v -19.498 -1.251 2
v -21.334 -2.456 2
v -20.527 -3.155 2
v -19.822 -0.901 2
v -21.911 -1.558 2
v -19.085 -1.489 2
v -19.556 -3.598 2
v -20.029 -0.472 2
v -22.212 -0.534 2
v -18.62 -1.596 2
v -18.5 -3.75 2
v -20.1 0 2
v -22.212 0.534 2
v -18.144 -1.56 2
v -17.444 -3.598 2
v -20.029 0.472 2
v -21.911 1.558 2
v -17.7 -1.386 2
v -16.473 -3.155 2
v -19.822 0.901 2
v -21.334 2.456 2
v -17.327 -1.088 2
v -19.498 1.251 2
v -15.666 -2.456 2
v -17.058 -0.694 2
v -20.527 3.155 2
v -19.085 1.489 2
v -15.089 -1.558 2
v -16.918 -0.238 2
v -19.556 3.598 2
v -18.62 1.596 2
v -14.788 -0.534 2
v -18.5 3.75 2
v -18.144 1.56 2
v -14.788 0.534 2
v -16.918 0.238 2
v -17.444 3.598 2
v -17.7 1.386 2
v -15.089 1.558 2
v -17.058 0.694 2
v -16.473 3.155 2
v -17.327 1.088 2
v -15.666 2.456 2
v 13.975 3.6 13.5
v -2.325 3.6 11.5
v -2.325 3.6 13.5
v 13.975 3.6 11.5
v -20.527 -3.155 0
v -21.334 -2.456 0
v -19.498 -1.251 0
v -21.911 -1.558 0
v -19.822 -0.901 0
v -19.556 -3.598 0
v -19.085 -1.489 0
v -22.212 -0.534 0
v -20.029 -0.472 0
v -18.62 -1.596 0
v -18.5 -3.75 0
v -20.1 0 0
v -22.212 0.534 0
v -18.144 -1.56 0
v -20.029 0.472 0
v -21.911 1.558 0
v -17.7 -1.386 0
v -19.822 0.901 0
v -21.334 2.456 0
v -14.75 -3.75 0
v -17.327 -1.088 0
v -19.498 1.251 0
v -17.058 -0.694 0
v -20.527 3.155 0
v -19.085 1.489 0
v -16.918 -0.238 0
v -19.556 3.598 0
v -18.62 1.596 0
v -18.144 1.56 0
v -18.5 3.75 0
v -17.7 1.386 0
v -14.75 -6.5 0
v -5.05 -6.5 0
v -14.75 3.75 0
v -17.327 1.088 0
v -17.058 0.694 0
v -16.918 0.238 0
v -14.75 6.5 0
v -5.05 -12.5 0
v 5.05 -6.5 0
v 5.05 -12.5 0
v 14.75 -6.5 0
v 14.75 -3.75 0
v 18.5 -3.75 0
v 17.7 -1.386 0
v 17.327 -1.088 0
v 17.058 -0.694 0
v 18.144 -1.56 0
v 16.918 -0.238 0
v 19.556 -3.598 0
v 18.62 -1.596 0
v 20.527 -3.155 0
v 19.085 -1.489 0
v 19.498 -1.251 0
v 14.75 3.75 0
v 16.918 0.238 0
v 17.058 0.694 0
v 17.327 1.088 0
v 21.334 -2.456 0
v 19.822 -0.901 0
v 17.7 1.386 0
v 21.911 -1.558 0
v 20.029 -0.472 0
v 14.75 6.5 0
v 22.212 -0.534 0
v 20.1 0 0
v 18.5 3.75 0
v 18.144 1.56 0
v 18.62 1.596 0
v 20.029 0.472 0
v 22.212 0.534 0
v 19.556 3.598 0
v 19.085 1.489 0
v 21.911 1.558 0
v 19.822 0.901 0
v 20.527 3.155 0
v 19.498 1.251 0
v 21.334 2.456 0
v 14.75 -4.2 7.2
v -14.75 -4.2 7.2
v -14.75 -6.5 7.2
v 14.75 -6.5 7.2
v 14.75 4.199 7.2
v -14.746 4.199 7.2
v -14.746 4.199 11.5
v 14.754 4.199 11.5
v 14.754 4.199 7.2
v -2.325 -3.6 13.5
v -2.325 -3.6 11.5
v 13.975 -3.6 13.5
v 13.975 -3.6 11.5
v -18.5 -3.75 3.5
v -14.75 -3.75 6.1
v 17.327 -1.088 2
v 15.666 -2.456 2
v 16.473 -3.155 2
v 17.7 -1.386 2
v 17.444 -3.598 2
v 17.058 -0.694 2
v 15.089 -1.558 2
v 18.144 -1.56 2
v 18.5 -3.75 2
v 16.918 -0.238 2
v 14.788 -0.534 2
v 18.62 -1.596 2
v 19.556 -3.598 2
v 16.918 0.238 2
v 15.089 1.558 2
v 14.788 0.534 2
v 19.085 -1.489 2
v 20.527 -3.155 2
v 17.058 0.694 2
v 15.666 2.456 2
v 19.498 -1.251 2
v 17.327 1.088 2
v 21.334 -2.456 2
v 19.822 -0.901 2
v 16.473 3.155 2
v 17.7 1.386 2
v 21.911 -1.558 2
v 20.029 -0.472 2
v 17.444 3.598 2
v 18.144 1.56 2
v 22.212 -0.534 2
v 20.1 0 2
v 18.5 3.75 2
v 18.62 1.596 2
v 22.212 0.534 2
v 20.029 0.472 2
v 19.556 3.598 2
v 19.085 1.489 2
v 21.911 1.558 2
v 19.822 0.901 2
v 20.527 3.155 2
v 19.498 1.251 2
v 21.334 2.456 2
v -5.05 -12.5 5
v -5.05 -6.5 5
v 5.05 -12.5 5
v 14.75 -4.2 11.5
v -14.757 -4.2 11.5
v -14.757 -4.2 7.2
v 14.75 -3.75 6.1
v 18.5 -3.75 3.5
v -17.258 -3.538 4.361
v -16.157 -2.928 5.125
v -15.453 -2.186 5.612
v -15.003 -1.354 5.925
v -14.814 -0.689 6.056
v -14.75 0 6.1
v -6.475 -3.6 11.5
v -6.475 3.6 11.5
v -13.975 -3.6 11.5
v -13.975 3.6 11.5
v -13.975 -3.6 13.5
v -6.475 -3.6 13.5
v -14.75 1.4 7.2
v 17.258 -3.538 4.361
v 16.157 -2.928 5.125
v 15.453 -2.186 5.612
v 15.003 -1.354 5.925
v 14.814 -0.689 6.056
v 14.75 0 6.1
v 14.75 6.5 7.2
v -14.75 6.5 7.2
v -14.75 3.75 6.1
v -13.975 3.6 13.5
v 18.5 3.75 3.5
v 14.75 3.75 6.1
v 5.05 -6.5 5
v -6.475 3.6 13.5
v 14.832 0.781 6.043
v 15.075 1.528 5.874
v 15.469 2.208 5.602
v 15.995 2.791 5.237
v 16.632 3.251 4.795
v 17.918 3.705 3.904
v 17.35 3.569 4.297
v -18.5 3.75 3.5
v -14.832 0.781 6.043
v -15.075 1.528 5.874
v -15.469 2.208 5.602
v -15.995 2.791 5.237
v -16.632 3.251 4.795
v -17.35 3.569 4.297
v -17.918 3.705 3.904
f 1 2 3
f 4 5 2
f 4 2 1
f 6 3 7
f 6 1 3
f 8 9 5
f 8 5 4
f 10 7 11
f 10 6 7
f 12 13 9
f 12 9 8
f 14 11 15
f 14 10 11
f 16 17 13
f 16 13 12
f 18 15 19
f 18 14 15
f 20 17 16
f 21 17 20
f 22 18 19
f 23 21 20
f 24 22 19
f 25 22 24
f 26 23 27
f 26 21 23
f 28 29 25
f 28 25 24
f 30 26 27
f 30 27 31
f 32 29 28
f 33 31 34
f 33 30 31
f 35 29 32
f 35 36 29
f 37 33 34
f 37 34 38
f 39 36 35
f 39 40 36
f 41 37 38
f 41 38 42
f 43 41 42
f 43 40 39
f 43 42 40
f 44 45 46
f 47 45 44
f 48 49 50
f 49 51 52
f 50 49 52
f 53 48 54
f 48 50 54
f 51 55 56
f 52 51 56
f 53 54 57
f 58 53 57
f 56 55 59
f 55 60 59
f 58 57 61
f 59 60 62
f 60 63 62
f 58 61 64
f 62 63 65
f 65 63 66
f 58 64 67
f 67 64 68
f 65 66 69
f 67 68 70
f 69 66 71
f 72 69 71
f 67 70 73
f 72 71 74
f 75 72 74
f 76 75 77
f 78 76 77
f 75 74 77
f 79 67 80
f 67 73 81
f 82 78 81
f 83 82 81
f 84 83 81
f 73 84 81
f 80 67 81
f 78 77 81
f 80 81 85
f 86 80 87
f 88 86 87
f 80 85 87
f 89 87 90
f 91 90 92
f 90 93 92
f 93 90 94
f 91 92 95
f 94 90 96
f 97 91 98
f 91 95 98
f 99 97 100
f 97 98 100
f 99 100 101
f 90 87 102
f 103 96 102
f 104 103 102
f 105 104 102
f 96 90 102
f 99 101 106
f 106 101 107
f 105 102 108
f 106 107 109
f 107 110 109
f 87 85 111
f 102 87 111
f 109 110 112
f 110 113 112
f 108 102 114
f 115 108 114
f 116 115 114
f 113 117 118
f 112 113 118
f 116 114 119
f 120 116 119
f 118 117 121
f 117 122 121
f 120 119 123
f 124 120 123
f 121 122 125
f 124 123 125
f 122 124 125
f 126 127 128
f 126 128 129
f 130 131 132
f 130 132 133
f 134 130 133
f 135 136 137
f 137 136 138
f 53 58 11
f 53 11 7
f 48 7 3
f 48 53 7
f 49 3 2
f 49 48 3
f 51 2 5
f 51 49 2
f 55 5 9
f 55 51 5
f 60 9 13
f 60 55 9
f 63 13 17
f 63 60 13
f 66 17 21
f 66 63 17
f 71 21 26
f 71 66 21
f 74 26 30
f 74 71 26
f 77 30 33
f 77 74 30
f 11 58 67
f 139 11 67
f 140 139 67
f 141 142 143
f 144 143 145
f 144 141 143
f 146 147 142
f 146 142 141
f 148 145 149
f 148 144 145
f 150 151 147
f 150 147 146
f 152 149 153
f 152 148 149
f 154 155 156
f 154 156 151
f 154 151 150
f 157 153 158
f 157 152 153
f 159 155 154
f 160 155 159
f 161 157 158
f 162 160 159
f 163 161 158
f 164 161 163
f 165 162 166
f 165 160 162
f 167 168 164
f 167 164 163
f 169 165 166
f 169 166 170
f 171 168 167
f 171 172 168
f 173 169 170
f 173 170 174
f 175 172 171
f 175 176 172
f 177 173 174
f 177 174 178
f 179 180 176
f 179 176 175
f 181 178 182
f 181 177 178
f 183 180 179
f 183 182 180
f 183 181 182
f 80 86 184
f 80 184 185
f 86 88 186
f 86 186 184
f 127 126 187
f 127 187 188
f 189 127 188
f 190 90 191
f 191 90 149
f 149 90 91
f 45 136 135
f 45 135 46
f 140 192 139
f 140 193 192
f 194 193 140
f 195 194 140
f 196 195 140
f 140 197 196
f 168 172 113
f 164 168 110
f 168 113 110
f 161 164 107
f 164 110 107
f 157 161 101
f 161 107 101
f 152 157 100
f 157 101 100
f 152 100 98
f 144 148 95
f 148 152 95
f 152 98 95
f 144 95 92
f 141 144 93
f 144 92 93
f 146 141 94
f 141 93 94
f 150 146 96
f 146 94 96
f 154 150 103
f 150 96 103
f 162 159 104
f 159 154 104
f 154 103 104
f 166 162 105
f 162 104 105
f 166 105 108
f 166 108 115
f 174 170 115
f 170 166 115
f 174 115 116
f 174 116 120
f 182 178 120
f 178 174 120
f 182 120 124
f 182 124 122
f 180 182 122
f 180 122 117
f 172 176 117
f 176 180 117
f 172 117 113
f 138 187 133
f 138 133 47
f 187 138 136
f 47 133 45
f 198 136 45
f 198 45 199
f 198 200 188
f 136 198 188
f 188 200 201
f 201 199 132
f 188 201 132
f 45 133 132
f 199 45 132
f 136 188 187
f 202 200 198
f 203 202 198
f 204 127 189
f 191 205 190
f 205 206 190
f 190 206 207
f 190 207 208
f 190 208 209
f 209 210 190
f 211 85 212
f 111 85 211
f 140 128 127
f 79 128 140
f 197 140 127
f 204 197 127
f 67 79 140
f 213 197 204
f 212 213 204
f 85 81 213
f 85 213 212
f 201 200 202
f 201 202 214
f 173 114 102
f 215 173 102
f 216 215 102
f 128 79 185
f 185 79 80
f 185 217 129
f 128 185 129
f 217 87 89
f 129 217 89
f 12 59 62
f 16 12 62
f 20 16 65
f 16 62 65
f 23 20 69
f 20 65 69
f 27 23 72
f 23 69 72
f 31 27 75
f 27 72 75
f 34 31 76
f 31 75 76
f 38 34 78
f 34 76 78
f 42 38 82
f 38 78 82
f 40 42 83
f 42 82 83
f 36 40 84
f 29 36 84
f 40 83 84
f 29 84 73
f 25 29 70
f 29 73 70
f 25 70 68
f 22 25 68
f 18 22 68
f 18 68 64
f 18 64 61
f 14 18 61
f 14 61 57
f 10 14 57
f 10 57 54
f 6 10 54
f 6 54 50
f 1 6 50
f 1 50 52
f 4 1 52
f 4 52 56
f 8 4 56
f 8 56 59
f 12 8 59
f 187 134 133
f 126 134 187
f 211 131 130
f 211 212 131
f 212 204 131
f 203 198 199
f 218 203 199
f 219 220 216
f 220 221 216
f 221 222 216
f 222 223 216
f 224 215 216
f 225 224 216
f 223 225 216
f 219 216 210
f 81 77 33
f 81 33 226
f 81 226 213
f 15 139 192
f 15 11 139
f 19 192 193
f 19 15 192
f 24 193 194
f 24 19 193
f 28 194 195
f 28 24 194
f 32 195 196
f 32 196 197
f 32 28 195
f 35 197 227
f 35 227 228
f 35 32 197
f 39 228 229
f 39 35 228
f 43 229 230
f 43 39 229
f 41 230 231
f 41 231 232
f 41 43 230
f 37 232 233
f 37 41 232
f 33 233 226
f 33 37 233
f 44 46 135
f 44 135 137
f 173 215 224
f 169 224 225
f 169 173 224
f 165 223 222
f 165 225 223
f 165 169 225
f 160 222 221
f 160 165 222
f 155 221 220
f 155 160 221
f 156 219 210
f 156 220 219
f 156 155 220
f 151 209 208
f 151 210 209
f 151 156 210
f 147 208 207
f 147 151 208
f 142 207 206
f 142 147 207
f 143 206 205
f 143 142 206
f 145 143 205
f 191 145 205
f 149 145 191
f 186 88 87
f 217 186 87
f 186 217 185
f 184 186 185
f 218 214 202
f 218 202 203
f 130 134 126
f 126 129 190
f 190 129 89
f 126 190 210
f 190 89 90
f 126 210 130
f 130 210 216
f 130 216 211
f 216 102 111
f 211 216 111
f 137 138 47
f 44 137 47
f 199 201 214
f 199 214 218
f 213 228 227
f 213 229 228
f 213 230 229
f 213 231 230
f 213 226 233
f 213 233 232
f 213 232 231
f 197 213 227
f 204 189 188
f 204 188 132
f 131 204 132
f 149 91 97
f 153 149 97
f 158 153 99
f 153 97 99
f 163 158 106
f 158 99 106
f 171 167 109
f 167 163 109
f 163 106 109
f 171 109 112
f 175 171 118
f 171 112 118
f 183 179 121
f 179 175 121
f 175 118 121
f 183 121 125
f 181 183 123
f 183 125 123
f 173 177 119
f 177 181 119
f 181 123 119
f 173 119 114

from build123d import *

# Parameters (mm, degrees)
SKETCH1_W           = 29.5
SKETCH1_H           = 13
BOSS_EXTRUDE1_DEPTH = 7.2
BOSS_EXTRUDE2_DEPTH = 4.3
SKETCH3_W           = 7.5
SKETCH3_H           = 7.2
SKETCH3_W_2         = 16.3
BOSS_EXTRUDE3_DEPTH = 2
SKETCH4_R           = 1.6
BOSS_EXTRUDE6_DEPTH = 2
SKETCH6_W           = 10.1
SKETCH6_H           = 6
BOSS_EXTRUDE7_DEPTH = 5
SKETCH7_W           = 3.75
SKETCH7_H           = 7.5
BOSS_EXTRUDE8_DEPTH = 4.1
CUT_EXTRUDE1_START  = -4.1
SKETCH8_R           = 3.75
CUT_EXTRUDE1_DEPTH  = 4.1
CUT_EXTRUDE2_DEPTH  = 31.681835017


with BuildPart() as part:
    # Sketch1 → Boss-Extrude1 (new body)
    with BuildSketch(Plane.XY):
        Rectangle(SKETCH1_W, SKETCH1_H)
    extrude(amount=BOSS_EXTRUDE1_DEPTH)

    # Sketch2 → Boss-Extrude2 (add)
    with BuildSketch(Plane.XY.offset(7.2)):
        Polygon((-14.746484108, 4.199496061), (14.753515892, 4.199496061), (14.75, -4.200497315), (-14.757033461, -4.200497315), align=None)
    extrude(amount=BOSS_EXTRUDE2_DEPTH)

    # Sketch3 → Boss-Extrude3 (add)
    with BuildSketch(Plane.XY.offset(11.5)):
        with Locations((-10.225, 0)):
            Rectangle(SKETCH3_W, SKETCH3_H)
        with Locations((5.825, 0)):
            Rectangle(SKETCH3_W_2, SKETCH3_H)
    extrude(amount=BOSS_EXTRUDE3_DEPTH)

    # Sketch4 → Boss-Extrude6 (add)
    # profile 1 of 2: a face of its own
    with BuildSketch(Plane(origin=(0, 0, 0), x_dir=(-1, 0, 0), z_dir=(0, 0, -1))):
        with BuildLine():
            Line((-14.75, 3.75), (-14.75, -3.75))
            Line((-14.75, -3.75), (-18.5, -3.75))
            ThreePointArc((-18.5, -3.75), (-22.25, 0), (-18.5, 3.75))
            Line((-18.5, 3.75), (-14.75, 3.75))
        make_face()
        with Locations(Location((-18.5, 0, 0), (0, 0, 180))):
            Circle(SKETCH4_R, mode=Mode.SUBTRACT)
    # profile 2 of 2: a face of its own
    with BuildSketch(Plane(origin=(0, 0, 0), x_dir=(-1, 0, 0), z_dir=(0, 0, -1))):
        with BuildLine():
            Line((18.5, 3.75), (14.75, 3.75))
            Line((14.75, 3.75), (14.75, -3.75))
            Line((14.75, -3.75), (18.5, -3.75))
            ThreePointArc((18.5, -3.75), (22.25, 0), (18.5, 3.75))
        make_face()
        with Locations((18.5, 0)):
            Circle(SKETCH4_R, mode=Mode.SUBTRACT)
    extrude(amount=-BOSS_EXTRUDE6_DEPTH)

    # Sketch6 → Boss-Extrude7 (add)
    with BuildSketch(Plane(origin=(0, 0, 0), x_dir=(-1, 0, 0), z_dir=(0, 0, -1))):
        with Locations((0, -9.5)):
            Rectangle(SKETCH6_W, SKETCH6_H)
    extrude(amount=-BOSS_EXTRUDE7_DEPTH)

    # Sketch7 → Boss-Extrude8 (add)
    with BuildSketch(Plane.XY.offset(2)):
        with Locations((-16.625, 0)):
            Rectangle(SKETCH7_W, SKETCH7_H)
        with Locations((16.625, 0)):
            Rectangle(SKETCH7_W, SKETCH7_H)
    extrude(amount=BOSS_EXTRUDE8_DEPTH)

    # Sketch8 → Cut-Extrude1 (cut)
    with BuildSketch(Plane.XY.offset(6.1).offset(CUT_EXTRUDE1_START)):
        with Locations((-18.5, 0)):
            Circle(SKETCH8_R)
        with Locations((18.5, 0)):
            Circle(SKETCH8_R)
    extrude(amount=CUT_EXTRUDE1_DEPTH, mode=Mode.SUBTRACT)

    # Sketch9 → Cut-Extrude2 (cut, through all)
    with BuildSketch(Plane(origin=(0, 3.75, 0), x_dir=(1, 0, 0), z_dir=(0, 1, 0))):
        Polygon((-18.5, -3.5), (-14.75, -6.1), (-18.5, -6.1), align=None)
        Polygon((18.5, -6.1), (18.5, -3.5), (14.75, -6.1), align=None)
    extrude(amount=-CUT_EXTRUDE2_DEPTH, mode=Mode.SUBTRACT)


solid = part.part
